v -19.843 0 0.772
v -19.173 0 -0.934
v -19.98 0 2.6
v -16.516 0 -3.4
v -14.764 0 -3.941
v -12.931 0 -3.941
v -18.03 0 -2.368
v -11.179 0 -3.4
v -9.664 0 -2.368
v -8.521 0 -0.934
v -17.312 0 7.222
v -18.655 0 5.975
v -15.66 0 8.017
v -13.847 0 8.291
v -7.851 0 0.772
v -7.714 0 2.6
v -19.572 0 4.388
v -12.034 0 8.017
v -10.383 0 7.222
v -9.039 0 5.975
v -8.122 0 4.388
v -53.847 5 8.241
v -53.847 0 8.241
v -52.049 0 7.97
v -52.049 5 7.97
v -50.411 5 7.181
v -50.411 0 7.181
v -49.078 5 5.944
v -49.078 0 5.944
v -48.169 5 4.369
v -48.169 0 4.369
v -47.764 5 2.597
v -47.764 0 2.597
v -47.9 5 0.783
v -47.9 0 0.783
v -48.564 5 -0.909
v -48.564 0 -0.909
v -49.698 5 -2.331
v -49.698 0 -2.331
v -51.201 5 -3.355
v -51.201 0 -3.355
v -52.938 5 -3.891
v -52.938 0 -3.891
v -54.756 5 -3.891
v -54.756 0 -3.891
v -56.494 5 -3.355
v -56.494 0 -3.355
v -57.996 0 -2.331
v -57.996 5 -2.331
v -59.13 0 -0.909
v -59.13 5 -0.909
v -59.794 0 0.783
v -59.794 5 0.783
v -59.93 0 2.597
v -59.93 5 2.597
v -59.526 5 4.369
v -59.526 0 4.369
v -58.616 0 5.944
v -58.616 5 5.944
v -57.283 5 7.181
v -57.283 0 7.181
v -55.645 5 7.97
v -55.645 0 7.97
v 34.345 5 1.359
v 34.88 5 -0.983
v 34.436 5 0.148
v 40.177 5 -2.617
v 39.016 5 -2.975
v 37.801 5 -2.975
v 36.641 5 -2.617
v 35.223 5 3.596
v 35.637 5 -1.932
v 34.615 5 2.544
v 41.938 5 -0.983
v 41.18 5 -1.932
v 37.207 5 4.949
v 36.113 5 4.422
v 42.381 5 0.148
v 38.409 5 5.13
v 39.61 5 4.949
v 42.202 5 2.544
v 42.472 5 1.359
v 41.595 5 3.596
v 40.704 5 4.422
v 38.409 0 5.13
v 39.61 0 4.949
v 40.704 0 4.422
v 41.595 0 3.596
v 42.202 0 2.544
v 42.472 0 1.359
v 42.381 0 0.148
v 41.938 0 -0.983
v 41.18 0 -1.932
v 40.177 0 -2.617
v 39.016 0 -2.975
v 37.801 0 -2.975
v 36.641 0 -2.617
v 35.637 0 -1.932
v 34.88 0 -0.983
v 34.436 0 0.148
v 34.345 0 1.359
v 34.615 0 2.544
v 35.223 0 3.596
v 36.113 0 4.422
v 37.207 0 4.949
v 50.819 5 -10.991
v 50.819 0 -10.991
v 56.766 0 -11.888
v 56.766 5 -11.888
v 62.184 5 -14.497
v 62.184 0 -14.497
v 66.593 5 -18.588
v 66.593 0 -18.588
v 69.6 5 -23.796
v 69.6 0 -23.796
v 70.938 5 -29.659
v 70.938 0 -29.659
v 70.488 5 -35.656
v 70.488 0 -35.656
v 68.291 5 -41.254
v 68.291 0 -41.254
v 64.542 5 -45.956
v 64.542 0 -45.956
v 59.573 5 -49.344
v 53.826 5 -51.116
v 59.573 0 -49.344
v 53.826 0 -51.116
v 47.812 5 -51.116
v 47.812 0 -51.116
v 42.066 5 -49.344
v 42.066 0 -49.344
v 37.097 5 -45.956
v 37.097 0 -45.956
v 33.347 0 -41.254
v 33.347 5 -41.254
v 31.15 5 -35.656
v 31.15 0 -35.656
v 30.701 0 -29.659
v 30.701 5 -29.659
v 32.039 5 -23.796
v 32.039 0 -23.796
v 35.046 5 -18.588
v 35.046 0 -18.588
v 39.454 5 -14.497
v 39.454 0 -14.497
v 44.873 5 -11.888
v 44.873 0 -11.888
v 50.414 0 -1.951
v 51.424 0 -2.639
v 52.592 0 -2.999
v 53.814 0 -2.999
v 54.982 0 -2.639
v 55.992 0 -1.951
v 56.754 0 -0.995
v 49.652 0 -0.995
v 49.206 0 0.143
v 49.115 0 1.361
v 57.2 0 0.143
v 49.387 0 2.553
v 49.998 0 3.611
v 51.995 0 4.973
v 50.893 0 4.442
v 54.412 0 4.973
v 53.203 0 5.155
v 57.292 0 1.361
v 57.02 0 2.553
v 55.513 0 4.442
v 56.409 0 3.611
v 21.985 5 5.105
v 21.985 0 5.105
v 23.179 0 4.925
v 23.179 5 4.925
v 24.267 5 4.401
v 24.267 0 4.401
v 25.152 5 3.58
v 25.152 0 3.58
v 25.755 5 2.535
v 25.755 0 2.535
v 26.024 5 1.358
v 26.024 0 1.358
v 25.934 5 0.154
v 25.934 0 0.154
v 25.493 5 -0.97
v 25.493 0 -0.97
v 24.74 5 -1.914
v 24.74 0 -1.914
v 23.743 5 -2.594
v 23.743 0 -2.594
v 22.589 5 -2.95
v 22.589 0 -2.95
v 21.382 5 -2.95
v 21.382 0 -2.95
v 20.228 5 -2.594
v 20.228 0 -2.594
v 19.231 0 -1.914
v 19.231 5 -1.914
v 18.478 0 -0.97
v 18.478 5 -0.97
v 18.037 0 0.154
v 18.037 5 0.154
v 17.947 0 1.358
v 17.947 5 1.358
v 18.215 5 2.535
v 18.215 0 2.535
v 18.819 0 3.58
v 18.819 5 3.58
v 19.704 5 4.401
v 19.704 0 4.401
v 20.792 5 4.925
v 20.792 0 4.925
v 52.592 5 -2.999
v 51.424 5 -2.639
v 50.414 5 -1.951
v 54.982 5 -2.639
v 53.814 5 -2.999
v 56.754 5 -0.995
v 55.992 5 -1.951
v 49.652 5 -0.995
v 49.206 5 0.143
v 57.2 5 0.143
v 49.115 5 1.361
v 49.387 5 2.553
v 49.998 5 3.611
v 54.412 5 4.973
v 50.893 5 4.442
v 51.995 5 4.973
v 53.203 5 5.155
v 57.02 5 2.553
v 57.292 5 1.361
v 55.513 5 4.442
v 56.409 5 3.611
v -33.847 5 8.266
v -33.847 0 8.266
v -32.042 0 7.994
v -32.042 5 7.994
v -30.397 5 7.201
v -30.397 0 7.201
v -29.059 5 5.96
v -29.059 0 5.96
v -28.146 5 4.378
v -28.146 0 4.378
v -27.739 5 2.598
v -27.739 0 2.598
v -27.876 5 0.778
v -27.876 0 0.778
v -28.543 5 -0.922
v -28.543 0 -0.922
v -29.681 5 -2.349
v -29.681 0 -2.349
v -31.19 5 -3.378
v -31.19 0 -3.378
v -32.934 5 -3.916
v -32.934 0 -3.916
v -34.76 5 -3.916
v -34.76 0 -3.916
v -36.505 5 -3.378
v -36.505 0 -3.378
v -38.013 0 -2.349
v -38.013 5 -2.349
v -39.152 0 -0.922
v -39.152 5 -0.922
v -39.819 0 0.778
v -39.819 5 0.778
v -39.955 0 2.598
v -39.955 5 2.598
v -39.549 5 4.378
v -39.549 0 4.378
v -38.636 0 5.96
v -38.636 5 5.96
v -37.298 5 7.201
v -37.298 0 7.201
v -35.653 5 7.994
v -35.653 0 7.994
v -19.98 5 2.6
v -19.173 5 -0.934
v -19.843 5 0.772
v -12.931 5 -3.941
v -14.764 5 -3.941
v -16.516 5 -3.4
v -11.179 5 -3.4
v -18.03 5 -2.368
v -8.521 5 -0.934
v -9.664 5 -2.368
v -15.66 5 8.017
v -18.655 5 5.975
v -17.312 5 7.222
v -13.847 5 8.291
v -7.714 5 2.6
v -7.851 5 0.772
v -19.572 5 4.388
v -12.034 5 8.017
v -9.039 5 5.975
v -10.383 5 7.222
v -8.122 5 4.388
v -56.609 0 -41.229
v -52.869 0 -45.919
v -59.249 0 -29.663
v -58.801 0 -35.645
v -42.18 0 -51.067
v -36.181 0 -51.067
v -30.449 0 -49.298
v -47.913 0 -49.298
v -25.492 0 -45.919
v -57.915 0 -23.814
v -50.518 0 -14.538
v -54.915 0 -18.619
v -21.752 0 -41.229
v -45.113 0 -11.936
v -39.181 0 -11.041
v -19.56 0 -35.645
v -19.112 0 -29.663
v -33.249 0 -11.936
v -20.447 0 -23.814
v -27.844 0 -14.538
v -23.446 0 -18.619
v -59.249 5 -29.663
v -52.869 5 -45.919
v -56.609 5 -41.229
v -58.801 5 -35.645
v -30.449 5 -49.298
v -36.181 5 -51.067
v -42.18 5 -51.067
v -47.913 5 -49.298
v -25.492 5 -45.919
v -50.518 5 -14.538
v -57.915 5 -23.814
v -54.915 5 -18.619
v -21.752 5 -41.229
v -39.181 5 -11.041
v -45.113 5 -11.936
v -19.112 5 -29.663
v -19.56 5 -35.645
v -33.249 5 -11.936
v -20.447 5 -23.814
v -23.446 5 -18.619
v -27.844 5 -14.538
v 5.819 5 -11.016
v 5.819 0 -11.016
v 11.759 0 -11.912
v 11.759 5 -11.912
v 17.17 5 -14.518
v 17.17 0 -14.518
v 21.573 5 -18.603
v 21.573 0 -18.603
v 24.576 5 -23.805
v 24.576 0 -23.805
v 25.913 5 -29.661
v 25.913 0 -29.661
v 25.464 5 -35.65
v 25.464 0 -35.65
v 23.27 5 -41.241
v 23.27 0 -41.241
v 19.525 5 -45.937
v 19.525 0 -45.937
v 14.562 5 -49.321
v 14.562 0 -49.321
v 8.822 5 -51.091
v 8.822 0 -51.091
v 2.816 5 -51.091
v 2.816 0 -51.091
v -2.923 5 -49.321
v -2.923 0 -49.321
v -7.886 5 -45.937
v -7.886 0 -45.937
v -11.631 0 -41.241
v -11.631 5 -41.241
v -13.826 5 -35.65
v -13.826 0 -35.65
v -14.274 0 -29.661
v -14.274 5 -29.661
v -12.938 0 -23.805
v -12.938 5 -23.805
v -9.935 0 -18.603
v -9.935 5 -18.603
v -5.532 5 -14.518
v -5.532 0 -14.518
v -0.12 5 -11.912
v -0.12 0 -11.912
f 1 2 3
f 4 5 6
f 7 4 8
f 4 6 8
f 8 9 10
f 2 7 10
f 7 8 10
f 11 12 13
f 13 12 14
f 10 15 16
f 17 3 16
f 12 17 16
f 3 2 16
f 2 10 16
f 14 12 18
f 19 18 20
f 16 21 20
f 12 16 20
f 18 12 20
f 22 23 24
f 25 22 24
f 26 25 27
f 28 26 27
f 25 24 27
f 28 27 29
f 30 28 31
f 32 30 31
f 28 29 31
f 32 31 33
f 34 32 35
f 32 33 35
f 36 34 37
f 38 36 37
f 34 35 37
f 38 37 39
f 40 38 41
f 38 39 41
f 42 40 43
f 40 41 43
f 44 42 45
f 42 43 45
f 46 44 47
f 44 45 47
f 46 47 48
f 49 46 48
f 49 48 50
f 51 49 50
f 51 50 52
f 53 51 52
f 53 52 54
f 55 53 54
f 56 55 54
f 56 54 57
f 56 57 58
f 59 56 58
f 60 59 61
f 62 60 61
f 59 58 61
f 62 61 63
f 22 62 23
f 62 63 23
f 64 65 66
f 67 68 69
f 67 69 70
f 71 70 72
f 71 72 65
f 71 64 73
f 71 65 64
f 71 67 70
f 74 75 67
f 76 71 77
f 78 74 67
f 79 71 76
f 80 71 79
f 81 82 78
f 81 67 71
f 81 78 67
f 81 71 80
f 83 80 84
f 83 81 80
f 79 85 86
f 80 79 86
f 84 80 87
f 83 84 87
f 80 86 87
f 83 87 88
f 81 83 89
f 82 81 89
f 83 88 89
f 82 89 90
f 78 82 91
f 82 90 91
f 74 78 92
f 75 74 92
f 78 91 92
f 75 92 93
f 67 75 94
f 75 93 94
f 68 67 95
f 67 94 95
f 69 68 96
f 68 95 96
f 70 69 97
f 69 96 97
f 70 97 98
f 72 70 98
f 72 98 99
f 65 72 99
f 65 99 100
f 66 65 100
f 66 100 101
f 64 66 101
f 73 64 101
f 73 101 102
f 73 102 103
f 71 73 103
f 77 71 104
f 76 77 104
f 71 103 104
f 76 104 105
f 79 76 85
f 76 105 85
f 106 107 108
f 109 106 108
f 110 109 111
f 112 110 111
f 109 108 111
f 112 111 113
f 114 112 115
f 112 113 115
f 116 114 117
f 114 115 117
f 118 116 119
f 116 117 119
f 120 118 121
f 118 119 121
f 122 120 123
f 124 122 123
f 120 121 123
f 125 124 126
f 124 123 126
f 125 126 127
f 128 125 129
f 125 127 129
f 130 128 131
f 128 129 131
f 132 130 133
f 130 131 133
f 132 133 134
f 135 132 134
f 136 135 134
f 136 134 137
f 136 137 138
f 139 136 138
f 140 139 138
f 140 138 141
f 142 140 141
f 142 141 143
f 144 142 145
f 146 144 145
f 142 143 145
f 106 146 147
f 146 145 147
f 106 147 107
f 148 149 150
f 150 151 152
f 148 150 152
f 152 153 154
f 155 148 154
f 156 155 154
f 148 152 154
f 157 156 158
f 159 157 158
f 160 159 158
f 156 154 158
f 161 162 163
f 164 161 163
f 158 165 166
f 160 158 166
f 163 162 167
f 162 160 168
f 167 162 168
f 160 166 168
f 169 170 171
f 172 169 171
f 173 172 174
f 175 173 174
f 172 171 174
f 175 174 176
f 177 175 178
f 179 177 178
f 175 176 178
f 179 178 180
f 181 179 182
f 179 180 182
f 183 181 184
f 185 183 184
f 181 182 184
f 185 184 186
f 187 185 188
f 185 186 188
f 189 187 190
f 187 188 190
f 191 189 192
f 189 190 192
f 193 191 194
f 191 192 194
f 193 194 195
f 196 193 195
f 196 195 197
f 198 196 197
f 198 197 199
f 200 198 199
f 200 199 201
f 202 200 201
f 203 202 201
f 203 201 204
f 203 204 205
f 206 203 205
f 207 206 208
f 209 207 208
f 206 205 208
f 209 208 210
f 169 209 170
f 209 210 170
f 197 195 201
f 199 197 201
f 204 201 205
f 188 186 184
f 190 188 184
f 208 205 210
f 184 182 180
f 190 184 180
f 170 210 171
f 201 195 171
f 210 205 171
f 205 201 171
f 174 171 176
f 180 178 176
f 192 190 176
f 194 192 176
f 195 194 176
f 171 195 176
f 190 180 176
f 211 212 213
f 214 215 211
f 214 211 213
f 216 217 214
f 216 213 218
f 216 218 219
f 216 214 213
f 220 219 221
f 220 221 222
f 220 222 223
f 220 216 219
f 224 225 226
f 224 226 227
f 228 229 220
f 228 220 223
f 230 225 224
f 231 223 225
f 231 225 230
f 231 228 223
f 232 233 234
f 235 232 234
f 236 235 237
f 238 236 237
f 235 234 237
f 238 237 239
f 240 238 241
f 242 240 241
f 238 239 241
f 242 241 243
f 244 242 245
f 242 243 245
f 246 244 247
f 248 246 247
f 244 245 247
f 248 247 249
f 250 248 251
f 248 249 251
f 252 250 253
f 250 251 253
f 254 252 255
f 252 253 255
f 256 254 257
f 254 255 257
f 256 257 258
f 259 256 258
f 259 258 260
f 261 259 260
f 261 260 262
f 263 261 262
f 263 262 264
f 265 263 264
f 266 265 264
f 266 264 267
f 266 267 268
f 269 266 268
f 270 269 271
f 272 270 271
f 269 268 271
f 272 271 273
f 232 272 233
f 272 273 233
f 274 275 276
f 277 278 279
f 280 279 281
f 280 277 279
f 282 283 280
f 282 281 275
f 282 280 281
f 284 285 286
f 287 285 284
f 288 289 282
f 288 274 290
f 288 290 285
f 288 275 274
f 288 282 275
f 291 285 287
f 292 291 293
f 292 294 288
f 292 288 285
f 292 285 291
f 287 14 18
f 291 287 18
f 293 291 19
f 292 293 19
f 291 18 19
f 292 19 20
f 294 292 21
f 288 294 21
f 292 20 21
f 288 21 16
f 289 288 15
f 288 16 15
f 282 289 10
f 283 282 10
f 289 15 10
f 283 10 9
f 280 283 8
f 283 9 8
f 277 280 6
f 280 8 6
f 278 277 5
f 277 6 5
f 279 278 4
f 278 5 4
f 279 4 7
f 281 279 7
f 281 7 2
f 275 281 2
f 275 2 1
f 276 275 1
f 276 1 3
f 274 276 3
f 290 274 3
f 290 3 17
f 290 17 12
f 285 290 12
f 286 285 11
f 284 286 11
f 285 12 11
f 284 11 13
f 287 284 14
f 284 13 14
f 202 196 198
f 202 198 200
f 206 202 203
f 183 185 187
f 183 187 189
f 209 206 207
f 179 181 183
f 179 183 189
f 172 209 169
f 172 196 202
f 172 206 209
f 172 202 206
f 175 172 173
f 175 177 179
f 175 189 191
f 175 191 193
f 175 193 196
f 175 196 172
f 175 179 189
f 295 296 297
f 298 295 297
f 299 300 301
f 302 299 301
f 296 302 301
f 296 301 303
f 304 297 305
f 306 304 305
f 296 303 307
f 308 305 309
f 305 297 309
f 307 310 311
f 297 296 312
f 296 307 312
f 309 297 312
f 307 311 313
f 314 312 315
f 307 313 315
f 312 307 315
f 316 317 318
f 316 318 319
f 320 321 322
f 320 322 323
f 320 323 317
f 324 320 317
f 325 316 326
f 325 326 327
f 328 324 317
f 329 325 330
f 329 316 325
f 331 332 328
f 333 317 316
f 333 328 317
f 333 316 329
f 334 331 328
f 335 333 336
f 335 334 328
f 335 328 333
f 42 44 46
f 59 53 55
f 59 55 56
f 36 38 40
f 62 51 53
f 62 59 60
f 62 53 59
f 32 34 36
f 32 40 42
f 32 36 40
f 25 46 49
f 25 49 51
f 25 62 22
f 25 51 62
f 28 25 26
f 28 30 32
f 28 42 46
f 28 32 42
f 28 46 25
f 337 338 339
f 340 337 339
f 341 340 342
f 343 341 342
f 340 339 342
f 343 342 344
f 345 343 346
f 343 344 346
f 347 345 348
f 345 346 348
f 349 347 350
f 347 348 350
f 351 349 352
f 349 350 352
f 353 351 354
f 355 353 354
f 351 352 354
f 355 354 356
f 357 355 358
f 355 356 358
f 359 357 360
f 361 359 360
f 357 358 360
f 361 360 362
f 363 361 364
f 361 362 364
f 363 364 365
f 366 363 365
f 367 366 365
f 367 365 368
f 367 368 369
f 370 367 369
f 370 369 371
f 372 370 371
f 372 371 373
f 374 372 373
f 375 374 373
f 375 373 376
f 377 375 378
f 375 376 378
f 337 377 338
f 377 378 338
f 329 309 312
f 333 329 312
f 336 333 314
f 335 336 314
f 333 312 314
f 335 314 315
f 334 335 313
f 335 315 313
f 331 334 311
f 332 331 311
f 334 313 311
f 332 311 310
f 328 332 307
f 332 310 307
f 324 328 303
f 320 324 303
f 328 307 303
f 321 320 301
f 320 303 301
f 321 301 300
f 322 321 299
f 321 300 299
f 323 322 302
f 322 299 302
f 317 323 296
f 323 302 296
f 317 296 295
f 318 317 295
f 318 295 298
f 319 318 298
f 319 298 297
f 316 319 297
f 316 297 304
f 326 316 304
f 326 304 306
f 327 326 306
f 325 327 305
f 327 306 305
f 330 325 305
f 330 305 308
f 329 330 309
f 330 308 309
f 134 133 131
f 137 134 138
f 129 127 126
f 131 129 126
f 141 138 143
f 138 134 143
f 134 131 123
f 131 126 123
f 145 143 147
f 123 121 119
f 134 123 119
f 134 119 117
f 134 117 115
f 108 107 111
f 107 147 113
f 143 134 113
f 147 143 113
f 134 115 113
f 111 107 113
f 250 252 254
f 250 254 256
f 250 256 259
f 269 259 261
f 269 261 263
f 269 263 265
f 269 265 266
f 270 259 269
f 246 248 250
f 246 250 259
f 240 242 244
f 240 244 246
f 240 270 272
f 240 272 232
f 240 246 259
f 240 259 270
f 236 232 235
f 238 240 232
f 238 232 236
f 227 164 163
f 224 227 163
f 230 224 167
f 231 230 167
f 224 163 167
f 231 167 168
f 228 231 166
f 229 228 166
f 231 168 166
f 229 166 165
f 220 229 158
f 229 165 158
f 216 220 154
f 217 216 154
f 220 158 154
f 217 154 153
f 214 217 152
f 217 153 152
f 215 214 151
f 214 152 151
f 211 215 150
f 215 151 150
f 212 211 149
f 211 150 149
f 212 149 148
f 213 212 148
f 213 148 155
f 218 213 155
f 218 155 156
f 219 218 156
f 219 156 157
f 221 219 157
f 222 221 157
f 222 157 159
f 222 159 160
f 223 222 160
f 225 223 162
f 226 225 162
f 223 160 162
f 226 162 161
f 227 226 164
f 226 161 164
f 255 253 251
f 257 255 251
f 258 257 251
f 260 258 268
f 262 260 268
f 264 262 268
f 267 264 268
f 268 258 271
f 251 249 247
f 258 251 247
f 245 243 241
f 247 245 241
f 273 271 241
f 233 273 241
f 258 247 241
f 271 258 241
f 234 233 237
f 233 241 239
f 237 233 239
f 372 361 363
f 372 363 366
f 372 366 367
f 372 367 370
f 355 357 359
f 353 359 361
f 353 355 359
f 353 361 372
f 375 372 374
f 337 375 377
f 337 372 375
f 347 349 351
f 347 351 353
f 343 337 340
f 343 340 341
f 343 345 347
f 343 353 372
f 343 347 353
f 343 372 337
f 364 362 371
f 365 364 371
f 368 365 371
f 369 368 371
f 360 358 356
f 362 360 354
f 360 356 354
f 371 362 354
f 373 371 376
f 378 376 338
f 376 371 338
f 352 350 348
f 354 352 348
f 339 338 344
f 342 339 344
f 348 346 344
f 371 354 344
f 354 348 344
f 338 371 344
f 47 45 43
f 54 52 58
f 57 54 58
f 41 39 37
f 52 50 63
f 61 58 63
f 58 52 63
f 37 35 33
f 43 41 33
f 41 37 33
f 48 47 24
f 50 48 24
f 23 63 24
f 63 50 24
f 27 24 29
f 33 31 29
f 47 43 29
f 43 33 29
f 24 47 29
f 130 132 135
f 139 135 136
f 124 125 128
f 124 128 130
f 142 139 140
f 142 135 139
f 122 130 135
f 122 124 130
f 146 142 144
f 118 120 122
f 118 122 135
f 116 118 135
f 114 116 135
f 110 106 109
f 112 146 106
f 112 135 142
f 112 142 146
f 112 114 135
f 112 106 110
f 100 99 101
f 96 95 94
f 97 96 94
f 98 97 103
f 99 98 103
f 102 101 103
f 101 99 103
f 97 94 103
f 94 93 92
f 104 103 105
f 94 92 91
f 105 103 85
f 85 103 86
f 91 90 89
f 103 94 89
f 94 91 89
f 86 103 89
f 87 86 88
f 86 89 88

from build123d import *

# Parameters (mm, degrees)
SKETCH1_R             = 20.125
BOSS_EXTRUDE1_DEPTH   = 5
SKETCH1_R_2           = 20.15
BOSS_EXTRUDE1_2_DEPTH = 5
SKETCH1_R_3           = 20.175
BOSS_EXTRUDE1_3_DEPTH = 5
SKETCH1_R_4           = 6.1
BOSS_EXTRUDE1_4_DEPTH = 5
SKETCH1_R_5           = 6.125
BOSS_EXTRUDE1_5_DEPTH = 5
SKETCH1_R_6           = 6.15
BOSS_EXTRUDE1_6_DEPTH = 5
SKETCH1_R_7           = 4.05
BOSS_EXTRUDE1_7_DEPTH = 5
SKETCH1_R_8           = 4.075
BOSS_EXTRUDE1_8_DEPTH = 5
SKETCH1_R_9           = 4.1
BOSS_EXTRUDE1_9_DEPTH = 5


with BuildPart() as part:
    # Sketch1 → Boss-Extrude1 (new body)
    with BuildSketch(Plane(origin=(0, 0, 0), x_dir=(1, 0, 0), z_dir=(0, 1, 0))):
        with Locations(Location((-39.180734063, 31.166493004, 0), (0, 0, 270))):
            Circle(SKETCH1_R)
    extrude(amount=BOSS_EXTRUDE1_DEPTH)


with BuildPart() as body_2:
    # Sketch1 → Boss-Extrude1 2 (new body)
    with BuildSketch(Plane(origin=(0, 0, 0), x_dir=(1, 0, 0), z_dir=(0, 1, 0))):
        with Locations(Location((5.819265937, 31.166493004, 0), (0, 0, 270))):
            Circle(SKETCH1_R_2)
    extrude(amount=BOSS_EXTRUDE1_2_DEPTH)


with BuildPart() as body_3:
    # Sketch1 → Boss-Extrude1 3 (new body)
    with BuildSketch(Plane(origin=(0, 0, 0), x_dir=(1, 0, 0), z_dir=(0, 1, 0))):
        with Locations(Location((50.819265937, 31.166493004, 0), (0, 0, 270))):
            Circle(SKETCH1_R_3)
    extrude(amount=BOSS_EXTRUDE1_3_DEPTH)


with BuildPart() as body_4:
    # Sketch1 → Boss-Extrude1 4 (new body)
    with BuildSketch(Plane(origin=(0, 0, 0), x_dir=(1, 0, 0), z_dir=(0, 1, 0))):
        with Locations(Location((-53.84723252, -2.140724535, 0), (0, 0, 270))):
            Circle(SKETCH1_R_4)
    extrude(amount=BOSS_EXTRUDE1_4_DEPTH)


with BuildPart() as body_5:
    # Sketch1 → Boss-Extrude1 5 (new body)
    with BuildSketch(Plane(origin=(0, 0, 0), x_dir=(1, 0, 0), z_dir=(0, 1, 0))):
        with Locations(Location((-33.84723252, -2.140724535, 0), (0, 0, 270))):
            Circle(SKETCH1_R_5)
    extrude(amount=BOSS_EXTRUDE1_5_DEPTH)


with BuildPart() as body_6:
    # Sketch1 → Boss-Extrude1 6 (new body)
    with BuildSketch(Plane(origin=(0, 0, 0), x_dir=(1, 0, 0), z_dir=(0, 1, 0))):
        with Locations(Location((-13.84723252, -2.140724535, 0), (0, 0, 270))):
            Circle(SKETCH1_R_6)
    extrude(amount=BOSS_EXTRUDE1_6_DEPTH)


with BuildPart() as body_7:
    # Sketch1 → Boss-Extrude1 7 (new body)
    with BuildSketch(Plane(origin=(0, 0, 0), x_dir=(1, 0, 0), z_dir=(0, 1, 0))):
        with Locations(Location((21.98532932, -1.054889327, 0), (0, 0, 270))):
            Circle(SKETCH1_R_7)
    extrude(amount=BOSS_EXTRUDE1_7_DEPTH)


with BuildPart() as body_8:
    # Sketch1 → Boss-Extrude1 8 (new body)
    with BuildSketch(Plane(origin=(0, 0, 0), x_dir=(1, 0, 0), z_dir=(0, 1, 0))):
        with Locations(Location((38.40858683, -1.054889327, 0), (0, 0, 270))):
            Circle(SKETCH1_R_8)
    extrude(amount=BOSS_EXTRUDE1_8_DEPTH)


with BuildPart() as body_9:
    # Sketch1 → Boss-Extrude1 9 (new body)
    with BuildSketch(Plane(origin=(0, 0, 0), x_dir=(1, 0, 0), z_dir=(0, 1, 0))):
        with Locations(Location((53.203091529, -1.054889327, 0), (0, 0, 270))):
            Circle(SKETCH1_R_9)
    extrude(amount=BOSS_EXTRUDE1_9_DEPTH)


solid = Compound([part.part, body_2.part, body_3.part, body_4.part, body_5.part, body_6.part, body_7.part, body_8.part, body_9.part])
